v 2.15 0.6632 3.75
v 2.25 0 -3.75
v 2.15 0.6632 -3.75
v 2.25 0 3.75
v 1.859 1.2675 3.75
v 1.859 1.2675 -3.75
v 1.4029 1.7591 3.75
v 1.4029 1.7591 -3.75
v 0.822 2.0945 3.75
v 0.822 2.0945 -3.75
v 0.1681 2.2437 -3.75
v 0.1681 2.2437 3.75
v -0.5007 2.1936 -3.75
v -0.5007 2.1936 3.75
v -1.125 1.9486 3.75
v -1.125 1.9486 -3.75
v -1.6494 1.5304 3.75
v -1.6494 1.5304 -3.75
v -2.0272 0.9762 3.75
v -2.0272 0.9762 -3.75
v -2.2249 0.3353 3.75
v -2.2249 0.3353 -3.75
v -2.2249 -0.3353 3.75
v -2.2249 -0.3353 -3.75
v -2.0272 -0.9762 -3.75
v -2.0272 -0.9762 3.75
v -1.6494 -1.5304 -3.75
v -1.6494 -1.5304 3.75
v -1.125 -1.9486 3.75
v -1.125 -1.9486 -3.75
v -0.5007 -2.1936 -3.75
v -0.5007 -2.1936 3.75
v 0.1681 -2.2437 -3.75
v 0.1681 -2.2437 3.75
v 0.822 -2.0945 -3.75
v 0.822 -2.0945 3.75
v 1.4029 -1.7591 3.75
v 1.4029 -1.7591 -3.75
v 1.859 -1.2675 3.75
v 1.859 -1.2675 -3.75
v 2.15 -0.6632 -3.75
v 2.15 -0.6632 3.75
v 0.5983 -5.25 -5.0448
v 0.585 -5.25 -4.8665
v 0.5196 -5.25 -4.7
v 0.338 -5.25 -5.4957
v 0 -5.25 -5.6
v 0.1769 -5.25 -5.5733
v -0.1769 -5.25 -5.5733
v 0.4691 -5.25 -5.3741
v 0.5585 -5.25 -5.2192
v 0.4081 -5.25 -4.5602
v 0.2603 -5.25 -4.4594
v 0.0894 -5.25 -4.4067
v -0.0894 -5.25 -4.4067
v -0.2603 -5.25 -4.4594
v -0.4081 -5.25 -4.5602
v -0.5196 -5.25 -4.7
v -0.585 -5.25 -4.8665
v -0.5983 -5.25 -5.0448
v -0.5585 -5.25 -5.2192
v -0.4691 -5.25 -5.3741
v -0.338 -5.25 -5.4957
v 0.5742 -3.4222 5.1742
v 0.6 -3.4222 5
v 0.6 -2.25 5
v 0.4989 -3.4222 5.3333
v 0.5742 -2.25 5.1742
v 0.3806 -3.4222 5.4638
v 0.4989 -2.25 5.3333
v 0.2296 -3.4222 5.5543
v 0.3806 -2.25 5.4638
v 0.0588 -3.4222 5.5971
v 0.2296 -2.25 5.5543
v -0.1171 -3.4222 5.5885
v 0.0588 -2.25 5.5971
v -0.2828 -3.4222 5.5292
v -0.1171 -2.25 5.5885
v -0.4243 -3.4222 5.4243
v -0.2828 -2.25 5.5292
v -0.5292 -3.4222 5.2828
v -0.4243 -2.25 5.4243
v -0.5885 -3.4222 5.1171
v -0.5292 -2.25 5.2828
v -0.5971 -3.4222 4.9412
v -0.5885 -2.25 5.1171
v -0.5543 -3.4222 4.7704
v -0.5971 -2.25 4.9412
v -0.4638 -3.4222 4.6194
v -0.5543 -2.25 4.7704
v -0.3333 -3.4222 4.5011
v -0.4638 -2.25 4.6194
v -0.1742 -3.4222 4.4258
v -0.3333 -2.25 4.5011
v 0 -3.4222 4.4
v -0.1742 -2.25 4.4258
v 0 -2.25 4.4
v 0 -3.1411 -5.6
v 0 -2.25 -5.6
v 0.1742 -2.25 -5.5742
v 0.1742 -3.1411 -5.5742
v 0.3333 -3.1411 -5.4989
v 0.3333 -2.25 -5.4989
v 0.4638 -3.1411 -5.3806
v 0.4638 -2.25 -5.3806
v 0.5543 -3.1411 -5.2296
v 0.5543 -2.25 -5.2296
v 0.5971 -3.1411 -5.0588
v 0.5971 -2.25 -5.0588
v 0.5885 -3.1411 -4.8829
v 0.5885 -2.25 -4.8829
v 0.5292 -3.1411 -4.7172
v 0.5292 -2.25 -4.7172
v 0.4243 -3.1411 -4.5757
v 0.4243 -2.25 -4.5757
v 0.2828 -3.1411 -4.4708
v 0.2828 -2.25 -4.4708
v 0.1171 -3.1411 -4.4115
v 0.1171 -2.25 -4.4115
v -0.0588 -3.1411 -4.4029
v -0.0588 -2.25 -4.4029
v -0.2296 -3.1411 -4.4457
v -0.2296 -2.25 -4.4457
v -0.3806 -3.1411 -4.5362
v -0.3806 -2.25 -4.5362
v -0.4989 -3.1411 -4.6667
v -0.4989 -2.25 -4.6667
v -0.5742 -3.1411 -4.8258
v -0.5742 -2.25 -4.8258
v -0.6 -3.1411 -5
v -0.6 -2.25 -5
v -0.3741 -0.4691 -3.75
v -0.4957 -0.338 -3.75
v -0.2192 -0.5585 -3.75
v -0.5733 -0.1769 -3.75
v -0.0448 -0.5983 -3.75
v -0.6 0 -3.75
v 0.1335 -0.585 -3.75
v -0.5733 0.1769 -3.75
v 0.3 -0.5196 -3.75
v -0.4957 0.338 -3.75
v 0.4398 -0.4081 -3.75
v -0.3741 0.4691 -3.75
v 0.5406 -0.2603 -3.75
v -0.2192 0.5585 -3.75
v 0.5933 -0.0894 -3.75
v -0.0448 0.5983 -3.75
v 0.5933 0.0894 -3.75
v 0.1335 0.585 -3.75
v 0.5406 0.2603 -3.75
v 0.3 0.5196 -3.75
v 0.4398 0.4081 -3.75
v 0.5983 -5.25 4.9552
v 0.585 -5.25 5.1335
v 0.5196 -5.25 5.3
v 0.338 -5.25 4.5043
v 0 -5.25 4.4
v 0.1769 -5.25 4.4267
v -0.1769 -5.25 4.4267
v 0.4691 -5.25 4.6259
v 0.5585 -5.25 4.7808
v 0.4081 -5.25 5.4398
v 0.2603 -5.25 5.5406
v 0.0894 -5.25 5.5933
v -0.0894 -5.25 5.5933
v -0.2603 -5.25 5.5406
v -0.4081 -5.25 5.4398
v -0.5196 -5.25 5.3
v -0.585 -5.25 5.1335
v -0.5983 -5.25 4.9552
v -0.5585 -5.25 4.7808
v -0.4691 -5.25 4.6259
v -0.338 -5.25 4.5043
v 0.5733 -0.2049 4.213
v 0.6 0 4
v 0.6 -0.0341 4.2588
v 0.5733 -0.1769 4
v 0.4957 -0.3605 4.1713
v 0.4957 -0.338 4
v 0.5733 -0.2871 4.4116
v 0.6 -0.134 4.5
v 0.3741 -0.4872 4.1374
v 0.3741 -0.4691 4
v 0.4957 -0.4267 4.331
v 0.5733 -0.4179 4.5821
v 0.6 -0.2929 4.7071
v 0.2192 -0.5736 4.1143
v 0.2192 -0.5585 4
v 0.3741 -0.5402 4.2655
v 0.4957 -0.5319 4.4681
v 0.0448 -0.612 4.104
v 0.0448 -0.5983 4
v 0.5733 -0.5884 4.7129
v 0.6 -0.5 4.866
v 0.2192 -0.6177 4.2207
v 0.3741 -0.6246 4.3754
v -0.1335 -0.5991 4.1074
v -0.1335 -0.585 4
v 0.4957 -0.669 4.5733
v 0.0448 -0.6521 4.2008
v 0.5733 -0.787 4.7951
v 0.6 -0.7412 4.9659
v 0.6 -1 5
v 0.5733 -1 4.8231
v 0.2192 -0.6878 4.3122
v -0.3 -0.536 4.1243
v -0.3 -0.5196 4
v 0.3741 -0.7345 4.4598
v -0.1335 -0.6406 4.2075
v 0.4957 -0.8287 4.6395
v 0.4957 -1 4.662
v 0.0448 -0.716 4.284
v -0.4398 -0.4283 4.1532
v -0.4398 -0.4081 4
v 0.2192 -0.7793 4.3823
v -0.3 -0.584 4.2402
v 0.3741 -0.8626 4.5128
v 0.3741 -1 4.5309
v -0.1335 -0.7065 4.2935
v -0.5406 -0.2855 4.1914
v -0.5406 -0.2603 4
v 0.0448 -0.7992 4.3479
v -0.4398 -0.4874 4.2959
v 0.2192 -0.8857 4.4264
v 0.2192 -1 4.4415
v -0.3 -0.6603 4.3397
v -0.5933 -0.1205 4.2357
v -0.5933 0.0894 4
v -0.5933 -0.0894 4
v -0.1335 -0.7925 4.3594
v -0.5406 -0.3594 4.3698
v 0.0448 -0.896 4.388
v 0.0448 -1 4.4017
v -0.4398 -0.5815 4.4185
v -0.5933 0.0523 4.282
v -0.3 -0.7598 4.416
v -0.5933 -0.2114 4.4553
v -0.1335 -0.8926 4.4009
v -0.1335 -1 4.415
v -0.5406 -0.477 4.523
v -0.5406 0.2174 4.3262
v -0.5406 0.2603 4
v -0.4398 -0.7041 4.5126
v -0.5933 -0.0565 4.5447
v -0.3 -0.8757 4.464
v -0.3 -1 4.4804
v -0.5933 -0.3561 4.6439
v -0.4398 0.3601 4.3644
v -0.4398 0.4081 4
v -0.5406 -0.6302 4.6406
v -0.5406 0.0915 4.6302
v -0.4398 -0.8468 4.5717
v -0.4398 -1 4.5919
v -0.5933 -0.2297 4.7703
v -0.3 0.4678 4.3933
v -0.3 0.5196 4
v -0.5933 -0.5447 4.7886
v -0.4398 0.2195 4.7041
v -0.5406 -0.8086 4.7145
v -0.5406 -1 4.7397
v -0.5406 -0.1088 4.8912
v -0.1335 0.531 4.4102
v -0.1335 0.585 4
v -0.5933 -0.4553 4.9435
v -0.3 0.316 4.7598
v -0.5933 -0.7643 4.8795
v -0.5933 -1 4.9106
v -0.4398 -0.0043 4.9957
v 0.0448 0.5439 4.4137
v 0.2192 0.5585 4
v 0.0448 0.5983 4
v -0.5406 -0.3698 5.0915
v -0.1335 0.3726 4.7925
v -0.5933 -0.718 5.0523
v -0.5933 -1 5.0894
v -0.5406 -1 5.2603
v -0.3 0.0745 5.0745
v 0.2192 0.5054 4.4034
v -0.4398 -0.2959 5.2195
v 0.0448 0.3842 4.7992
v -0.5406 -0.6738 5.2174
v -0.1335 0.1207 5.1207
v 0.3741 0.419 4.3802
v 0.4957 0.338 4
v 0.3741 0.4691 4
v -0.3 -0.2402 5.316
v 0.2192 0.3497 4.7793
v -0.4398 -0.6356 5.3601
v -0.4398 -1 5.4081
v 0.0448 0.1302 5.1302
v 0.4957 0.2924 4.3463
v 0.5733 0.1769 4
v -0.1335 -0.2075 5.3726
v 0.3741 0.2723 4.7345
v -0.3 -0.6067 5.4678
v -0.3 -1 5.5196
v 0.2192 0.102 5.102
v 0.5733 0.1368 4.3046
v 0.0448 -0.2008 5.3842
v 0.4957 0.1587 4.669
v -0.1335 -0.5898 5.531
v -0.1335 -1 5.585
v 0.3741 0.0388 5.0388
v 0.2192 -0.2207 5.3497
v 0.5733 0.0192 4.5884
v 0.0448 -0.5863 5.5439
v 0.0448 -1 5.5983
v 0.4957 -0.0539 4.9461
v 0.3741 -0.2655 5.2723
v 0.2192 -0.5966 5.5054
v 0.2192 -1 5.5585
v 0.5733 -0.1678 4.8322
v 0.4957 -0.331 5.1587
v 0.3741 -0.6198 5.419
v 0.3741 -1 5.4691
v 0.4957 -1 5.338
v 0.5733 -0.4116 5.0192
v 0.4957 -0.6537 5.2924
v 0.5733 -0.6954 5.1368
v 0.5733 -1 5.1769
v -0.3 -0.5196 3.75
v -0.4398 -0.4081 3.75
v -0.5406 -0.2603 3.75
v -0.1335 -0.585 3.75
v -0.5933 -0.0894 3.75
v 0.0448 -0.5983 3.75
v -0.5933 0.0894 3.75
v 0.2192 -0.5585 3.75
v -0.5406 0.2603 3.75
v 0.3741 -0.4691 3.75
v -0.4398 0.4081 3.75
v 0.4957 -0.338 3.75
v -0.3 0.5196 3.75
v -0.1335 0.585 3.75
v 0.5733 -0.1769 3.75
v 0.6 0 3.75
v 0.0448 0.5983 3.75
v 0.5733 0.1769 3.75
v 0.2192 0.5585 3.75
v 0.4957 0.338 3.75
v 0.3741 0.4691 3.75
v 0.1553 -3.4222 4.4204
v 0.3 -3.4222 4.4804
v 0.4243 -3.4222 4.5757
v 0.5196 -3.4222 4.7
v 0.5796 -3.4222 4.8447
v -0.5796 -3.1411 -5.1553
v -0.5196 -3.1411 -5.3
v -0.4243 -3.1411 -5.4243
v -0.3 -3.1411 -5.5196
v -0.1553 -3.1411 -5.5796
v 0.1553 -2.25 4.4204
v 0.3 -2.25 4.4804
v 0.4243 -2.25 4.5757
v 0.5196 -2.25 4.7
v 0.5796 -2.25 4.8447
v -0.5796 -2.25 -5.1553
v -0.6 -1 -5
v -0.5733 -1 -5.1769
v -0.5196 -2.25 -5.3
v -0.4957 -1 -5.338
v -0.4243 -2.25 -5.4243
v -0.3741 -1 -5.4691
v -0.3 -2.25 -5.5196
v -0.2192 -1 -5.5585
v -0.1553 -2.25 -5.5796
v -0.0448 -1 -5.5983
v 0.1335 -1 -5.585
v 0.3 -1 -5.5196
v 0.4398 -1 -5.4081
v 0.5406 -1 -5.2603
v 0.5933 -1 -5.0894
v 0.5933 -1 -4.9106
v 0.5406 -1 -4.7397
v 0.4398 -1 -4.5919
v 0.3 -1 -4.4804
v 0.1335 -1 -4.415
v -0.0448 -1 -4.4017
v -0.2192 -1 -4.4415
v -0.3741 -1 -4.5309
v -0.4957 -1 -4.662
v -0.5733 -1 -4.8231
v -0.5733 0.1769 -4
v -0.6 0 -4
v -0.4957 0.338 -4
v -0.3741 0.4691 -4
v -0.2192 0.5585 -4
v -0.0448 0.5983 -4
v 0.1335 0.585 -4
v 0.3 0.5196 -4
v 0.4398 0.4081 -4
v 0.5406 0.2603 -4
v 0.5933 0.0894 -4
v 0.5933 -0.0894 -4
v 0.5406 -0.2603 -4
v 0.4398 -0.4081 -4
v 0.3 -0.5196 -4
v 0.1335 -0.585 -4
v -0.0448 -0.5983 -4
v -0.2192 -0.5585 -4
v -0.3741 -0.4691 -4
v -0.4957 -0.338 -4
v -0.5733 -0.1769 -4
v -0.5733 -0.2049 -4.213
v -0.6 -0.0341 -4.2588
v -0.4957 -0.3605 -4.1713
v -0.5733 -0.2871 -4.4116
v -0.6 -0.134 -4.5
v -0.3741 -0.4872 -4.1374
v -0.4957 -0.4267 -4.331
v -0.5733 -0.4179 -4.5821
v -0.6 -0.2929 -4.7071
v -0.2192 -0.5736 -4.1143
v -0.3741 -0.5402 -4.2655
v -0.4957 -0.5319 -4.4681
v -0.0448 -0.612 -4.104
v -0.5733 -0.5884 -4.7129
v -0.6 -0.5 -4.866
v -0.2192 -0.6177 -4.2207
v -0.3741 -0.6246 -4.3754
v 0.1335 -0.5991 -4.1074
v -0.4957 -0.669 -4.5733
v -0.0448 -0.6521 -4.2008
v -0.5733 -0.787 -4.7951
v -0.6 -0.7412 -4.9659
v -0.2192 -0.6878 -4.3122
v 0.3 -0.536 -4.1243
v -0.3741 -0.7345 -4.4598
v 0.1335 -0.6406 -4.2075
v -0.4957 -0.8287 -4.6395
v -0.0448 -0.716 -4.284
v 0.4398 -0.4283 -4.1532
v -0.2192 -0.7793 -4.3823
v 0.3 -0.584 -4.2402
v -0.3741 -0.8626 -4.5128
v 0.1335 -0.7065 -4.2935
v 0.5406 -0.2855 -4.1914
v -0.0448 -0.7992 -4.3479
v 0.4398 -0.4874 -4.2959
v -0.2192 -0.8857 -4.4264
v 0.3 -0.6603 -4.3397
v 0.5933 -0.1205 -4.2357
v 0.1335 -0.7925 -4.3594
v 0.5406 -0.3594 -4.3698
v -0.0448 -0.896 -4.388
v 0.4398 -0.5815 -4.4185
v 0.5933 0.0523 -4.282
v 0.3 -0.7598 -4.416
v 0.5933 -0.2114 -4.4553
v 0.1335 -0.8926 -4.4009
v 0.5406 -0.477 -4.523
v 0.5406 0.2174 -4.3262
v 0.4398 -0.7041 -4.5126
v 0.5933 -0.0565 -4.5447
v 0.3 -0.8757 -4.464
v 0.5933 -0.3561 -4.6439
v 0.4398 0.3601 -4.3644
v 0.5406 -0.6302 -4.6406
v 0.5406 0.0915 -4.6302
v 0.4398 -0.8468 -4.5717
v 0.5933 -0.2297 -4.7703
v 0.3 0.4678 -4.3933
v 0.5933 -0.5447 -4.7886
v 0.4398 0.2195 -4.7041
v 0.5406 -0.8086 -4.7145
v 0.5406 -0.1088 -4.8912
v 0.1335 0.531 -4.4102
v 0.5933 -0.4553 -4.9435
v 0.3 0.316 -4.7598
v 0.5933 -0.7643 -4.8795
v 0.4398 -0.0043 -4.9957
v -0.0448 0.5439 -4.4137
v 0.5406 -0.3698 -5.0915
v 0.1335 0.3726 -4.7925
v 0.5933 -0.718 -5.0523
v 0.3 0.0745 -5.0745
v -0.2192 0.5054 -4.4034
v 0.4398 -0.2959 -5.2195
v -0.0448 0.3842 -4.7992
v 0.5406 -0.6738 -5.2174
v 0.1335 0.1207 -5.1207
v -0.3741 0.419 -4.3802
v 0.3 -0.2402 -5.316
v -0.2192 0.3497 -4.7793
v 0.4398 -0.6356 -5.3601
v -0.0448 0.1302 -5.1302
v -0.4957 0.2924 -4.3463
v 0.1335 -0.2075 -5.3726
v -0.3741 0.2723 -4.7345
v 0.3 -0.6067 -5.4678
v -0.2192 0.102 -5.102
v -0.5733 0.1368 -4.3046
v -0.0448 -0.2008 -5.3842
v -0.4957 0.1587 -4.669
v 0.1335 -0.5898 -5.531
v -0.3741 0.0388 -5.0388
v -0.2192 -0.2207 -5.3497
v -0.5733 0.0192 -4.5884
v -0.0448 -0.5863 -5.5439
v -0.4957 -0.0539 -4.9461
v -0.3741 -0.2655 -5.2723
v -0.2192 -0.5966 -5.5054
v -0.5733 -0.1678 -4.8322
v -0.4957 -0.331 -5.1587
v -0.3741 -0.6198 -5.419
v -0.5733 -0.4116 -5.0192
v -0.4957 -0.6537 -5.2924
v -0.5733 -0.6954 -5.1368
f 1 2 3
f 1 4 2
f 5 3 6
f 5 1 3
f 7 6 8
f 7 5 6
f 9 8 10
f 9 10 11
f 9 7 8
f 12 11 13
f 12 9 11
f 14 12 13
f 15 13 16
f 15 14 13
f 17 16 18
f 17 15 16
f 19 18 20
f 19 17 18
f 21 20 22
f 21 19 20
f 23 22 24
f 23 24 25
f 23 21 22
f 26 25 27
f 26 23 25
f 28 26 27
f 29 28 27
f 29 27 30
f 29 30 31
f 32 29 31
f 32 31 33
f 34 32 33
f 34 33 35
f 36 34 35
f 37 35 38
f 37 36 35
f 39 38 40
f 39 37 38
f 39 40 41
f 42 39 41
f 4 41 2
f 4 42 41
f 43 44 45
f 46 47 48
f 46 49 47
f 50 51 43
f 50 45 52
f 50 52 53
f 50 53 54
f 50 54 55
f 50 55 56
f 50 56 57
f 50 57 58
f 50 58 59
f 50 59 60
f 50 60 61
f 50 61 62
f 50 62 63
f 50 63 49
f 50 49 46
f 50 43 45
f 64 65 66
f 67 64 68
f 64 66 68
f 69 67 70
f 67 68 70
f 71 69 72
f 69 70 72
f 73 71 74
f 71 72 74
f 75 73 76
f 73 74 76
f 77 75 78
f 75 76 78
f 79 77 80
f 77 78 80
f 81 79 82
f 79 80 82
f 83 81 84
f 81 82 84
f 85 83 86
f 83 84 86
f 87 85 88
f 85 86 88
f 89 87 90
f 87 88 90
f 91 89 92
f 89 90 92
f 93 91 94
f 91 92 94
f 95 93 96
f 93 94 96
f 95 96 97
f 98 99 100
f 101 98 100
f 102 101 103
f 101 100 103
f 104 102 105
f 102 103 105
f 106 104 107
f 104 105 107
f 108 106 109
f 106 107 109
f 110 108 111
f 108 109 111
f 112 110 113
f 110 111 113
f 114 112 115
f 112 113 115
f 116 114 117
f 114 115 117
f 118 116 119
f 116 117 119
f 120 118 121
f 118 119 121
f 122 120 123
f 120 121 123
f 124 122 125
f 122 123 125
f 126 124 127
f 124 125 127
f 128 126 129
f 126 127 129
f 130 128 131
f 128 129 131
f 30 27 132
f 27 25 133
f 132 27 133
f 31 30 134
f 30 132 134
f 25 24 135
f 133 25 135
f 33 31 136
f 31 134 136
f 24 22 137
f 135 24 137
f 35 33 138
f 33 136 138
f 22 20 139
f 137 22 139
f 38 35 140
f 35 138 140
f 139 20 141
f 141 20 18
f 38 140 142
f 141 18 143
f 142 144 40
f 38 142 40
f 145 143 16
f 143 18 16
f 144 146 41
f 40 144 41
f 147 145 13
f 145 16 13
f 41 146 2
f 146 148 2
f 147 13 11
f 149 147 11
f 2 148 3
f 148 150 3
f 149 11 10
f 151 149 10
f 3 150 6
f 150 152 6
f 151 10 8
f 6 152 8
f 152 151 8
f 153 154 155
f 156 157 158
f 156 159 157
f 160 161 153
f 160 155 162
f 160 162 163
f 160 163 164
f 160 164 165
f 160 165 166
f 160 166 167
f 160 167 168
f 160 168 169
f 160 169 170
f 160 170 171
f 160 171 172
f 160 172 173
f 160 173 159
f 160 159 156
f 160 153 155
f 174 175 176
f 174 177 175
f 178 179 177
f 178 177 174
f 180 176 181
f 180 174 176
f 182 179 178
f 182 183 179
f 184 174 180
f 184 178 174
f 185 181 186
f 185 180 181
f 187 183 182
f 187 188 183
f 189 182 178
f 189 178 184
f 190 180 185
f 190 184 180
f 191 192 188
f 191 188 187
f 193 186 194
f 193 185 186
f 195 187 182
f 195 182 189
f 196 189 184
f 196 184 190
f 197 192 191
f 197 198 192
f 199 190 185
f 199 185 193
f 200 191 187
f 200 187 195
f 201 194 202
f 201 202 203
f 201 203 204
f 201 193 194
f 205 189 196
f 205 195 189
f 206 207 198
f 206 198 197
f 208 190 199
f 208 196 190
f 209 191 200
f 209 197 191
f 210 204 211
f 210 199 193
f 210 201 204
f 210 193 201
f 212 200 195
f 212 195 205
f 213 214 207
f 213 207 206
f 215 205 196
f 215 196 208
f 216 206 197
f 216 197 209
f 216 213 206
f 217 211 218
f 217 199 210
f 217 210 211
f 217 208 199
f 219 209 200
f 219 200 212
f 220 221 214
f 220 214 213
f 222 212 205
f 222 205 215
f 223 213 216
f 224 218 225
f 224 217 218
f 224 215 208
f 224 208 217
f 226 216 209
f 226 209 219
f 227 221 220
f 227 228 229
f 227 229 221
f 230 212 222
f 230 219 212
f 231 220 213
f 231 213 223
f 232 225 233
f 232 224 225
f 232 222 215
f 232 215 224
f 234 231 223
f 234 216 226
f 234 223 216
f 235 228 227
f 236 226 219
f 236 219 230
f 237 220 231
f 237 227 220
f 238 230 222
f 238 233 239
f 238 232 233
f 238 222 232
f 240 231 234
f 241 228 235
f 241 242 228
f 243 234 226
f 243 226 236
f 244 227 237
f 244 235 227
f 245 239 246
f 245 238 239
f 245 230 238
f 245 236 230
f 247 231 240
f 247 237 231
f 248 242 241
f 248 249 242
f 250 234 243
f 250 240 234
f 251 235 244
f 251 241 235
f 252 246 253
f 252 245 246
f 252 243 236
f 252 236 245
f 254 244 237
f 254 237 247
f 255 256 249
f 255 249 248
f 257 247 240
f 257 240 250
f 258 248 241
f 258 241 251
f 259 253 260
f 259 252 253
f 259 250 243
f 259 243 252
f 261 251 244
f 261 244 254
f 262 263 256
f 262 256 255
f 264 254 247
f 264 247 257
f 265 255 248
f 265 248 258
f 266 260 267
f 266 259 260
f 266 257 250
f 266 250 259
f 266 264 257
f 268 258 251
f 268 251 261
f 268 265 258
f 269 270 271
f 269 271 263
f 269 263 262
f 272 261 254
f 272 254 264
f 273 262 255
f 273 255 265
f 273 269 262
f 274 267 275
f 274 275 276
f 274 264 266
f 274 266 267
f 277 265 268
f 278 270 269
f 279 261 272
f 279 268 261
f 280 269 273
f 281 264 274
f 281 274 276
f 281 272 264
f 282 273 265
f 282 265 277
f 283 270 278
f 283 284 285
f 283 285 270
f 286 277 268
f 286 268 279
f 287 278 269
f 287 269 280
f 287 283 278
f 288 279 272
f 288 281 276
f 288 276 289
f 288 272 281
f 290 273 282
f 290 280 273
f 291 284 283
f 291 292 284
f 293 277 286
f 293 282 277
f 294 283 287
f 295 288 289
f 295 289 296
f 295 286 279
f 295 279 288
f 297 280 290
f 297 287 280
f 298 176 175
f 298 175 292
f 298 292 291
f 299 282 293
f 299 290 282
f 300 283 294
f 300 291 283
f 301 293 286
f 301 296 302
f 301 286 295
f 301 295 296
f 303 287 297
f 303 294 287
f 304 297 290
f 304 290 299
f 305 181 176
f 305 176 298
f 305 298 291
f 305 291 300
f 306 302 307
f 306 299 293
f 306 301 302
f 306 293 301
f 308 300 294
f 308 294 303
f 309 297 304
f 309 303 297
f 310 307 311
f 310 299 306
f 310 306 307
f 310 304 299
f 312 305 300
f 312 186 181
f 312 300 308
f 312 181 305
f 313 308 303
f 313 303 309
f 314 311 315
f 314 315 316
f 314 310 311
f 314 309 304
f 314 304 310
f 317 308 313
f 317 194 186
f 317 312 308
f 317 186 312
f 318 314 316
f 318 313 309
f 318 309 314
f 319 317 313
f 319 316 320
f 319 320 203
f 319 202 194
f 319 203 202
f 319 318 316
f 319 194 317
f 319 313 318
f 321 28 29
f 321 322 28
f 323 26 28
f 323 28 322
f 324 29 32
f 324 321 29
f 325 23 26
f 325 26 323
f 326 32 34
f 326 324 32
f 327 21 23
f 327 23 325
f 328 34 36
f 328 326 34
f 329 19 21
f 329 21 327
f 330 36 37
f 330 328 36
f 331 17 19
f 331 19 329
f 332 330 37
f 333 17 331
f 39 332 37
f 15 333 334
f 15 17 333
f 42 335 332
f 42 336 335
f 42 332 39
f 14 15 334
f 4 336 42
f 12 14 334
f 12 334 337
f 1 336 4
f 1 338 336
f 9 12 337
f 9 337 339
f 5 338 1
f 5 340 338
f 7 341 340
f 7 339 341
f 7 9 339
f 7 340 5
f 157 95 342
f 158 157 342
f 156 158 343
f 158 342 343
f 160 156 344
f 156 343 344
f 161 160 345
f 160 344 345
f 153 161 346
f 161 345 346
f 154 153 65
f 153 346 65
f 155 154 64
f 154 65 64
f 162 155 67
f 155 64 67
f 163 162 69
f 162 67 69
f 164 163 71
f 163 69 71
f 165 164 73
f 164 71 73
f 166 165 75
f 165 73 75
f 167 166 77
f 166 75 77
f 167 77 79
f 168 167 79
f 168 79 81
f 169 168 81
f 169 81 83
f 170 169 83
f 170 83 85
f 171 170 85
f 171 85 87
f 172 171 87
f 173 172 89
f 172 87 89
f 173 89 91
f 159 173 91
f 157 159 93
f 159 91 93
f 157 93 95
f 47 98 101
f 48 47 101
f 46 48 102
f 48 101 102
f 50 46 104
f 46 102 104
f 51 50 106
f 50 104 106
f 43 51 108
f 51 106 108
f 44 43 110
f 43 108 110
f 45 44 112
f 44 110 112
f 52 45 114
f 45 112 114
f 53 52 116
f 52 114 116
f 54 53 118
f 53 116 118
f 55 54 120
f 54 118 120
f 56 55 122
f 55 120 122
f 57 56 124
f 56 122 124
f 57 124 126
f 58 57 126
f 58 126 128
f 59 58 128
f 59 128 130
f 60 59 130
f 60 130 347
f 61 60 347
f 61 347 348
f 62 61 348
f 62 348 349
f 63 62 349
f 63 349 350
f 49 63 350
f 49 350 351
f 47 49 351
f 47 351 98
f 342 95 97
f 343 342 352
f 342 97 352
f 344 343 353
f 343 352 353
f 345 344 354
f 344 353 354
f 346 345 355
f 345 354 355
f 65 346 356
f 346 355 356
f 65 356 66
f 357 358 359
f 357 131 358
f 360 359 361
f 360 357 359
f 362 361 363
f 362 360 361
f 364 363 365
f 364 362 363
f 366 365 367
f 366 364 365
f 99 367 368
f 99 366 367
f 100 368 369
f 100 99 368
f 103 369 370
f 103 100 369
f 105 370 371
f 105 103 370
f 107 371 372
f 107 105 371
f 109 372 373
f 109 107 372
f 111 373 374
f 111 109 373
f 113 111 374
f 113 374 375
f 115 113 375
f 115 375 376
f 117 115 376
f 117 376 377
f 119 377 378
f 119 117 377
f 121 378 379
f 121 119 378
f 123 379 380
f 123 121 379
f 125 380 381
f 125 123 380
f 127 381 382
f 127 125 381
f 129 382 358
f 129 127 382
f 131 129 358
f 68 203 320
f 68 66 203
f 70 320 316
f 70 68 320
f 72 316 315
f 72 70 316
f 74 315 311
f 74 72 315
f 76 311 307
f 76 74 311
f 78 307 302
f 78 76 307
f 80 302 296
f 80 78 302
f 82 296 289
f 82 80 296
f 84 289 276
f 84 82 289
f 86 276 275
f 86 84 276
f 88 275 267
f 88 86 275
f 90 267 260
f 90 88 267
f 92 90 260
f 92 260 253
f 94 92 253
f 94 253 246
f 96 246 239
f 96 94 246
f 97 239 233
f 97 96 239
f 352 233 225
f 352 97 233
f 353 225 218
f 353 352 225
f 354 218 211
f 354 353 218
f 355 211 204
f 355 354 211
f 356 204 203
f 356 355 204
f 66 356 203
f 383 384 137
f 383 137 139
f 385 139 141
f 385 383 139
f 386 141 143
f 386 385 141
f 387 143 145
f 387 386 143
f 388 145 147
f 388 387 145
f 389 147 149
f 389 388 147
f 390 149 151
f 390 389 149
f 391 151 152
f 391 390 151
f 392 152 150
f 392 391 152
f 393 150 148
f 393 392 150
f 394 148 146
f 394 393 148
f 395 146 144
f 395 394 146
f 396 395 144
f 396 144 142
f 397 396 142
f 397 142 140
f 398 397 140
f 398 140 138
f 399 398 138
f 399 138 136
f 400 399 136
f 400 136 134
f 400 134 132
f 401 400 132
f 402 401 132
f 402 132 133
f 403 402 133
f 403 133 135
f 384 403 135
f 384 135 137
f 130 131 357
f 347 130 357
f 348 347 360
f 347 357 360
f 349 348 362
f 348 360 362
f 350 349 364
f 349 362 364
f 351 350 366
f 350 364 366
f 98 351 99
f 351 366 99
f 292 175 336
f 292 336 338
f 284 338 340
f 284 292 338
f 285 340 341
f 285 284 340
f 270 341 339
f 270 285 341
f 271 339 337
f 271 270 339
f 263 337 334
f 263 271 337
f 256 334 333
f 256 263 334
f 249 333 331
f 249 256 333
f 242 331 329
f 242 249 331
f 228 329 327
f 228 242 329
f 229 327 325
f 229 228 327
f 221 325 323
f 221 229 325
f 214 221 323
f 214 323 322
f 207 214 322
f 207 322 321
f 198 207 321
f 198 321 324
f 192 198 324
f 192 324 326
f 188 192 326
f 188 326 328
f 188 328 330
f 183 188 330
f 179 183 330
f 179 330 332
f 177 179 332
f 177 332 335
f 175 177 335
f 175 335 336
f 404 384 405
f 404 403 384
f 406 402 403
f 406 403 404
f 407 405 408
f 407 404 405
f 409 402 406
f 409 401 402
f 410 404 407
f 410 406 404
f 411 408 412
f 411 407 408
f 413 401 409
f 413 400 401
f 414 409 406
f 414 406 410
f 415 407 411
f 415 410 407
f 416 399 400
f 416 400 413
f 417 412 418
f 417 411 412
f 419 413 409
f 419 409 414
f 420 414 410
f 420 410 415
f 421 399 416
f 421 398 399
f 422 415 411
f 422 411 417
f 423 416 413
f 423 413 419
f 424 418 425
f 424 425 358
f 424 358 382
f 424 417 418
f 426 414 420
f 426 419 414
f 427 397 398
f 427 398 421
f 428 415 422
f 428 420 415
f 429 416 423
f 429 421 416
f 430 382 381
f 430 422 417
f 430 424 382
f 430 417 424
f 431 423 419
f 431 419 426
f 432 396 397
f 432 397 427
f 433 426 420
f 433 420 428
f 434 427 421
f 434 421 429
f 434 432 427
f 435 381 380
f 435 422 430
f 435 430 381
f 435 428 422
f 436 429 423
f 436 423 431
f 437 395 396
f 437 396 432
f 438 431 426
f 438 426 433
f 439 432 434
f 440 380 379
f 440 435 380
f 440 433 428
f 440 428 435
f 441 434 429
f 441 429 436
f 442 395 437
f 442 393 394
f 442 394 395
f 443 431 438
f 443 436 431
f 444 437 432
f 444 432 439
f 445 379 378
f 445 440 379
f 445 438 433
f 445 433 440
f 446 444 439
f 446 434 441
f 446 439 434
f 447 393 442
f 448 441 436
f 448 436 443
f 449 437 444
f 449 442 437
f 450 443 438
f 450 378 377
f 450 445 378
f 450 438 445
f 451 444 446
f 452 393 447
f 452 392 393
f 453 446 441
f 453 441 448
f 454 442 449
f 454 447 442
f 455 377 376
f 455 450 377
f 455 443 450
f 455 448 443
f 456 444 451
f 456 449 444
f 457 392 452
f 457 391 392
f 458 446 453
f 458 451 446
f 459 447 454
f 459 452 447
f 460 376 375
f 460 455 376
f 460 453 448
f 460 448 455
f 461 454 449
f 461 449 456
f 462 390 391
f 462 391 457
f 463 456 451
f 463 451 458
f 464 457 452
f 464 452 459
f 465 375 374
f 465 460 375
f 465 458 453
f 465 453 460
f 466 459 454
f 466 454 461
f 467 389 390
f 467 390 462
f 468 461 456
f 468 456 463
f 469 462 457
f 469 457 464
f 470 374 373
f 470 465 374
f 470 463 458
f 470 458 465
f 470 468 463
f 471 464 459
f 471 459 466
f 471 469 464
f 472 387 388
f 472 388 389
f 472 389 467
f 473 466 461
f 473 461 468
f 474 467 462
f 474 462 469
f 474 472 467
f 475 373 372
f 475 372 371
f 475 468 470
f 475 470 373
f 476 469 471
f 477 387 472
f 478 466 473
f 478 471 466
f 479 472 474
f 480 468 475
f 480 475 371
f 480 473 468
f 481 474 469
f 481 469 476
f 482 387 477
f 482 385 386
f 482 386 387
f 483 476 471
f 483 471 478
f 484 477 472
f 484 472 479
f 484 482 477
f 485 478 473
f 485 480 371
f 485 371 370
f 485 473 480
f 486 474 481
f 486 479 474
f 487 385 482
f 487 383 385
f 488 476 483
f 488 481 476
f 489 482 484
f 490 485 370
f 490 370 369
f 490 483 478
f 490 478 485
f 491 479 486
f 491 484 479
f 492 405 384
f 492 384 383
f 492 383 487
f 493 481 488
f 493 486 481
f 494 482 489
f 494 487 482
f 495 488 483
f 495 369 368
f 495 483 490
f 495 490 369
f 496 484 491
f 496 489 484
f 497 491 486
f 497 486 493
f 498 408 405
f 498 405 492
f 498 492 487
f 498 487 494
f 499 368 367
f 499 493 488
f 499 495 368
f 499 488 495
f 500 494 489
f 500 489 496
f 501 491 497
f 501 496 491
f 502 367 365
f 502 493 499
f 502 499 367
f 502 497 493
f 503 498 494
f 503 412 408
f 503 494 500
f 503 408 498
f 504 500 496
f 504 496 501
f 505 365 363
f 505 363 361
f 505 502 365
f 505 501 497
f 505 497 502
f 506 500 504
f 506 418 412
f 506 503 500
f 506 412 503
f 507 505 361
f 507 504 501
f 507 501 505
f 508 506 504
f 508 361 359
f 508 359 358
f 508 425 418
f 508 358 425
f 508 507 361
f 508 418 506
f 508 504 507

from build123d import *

# Parameters (mm, degrees)
SKETCH_1_R        = 2.25
EXTRUDE_1_DEPTH   = 3.75
SKETCH_4_R        = 0.6
EXTRUDE_2_DEPTH   = 3
EXTRUDE_2_2_DEPTH = 3
SKETCH_2_R        = 0.6
SKETCH_7_R        = 0.6


with BuildPart() as part:
    # Эскиз1 → Бобышка-Вытянуть1 (new, symmetric)
    with BuildSketch(Plane.XY):
        Circle(SKETCH_1_R)
    extrude(amount=EXTRUDE_1_DEPTH, both=True)



with BuildPart() as body_2:
    # Эскиз4 → Бобышка-Вытянуть2 (new body)
    with BuildSketch(Plane(origin=(0, -2.25, 0), x_dir=(-1, 0, 0), z_dir=(0, -1, 0))):
        with Locations(Location((0, -5, 0), (0, 0, 90))):
            Circle(SKETCH_4_R)
    extrude(amount=EXTRUDE_2_DEPTH)


with BuildPart() as body_3:
    # Эскиз4 → Extrude 2 2 (new body)
    with BuildSketch(Plane(origin=(0, -2.25, 0), x_dir=(-1, 0, 0), z_dir=(0, -1, 0))):
        with Locations(Location((0, 5, 0), (0, 0, 90))):
            Circle(SKETCH_4_R)
    extrude(amount=EXTRUDE_2_2_DEPTH)


with BuildPart() as part_1:
    add(part.part)

    add(body_2.part)  # По траектории2 merges body 2
    # По траектории2: sweep along a path in Эскиз5
    with BuildLine(Plane(origin=(0, 0, 0), x_dir=(0, 0, -1), z_dir=(1, 0, 0))) as sweep_2_path:
        Line((-3.75, 0), (-4, 0))
        ThreePointArc((-4, 0), (-4.707106781, -0.292893219), (-5, -1))
        Line((-5, -1), (-5, -3.422153909))
    # Эскиз2 → По траектории2 (sweep)
    with BuildSketch(Plane.XY.offset(3.75)):
        Circle(SKETCH_2_R)
    sweep(path=sweep_2_path.line)


    add(body_3.part)  # По траектории3 merges body 3
    # По траектории3: sweep along a path in Эскиз6
    with BuildLine(Plane(origin=(0, 0, 0), x_dir=(0, 0, -1), z_dir=(1, 0, 0))) as sweep_3_path:
        Line((3.75, 0), (4, 0))
        ThreePointArc((4, 0), (4.707106781, -0.292893219), (5, -1))
        Line((5, -1), (5, -3.141146962))
    # Эскиз7 → По траектории3 (sweep)
    with BuildSketch(Plane(origin=(0, 0, -3.75), x_dir=(-1, 0, 0), z_dir=(0, 0, -1))):
        Circle(SKETCH_7_R)
    sweep(path=sweep_3_path.line)


solid = part_1.part
